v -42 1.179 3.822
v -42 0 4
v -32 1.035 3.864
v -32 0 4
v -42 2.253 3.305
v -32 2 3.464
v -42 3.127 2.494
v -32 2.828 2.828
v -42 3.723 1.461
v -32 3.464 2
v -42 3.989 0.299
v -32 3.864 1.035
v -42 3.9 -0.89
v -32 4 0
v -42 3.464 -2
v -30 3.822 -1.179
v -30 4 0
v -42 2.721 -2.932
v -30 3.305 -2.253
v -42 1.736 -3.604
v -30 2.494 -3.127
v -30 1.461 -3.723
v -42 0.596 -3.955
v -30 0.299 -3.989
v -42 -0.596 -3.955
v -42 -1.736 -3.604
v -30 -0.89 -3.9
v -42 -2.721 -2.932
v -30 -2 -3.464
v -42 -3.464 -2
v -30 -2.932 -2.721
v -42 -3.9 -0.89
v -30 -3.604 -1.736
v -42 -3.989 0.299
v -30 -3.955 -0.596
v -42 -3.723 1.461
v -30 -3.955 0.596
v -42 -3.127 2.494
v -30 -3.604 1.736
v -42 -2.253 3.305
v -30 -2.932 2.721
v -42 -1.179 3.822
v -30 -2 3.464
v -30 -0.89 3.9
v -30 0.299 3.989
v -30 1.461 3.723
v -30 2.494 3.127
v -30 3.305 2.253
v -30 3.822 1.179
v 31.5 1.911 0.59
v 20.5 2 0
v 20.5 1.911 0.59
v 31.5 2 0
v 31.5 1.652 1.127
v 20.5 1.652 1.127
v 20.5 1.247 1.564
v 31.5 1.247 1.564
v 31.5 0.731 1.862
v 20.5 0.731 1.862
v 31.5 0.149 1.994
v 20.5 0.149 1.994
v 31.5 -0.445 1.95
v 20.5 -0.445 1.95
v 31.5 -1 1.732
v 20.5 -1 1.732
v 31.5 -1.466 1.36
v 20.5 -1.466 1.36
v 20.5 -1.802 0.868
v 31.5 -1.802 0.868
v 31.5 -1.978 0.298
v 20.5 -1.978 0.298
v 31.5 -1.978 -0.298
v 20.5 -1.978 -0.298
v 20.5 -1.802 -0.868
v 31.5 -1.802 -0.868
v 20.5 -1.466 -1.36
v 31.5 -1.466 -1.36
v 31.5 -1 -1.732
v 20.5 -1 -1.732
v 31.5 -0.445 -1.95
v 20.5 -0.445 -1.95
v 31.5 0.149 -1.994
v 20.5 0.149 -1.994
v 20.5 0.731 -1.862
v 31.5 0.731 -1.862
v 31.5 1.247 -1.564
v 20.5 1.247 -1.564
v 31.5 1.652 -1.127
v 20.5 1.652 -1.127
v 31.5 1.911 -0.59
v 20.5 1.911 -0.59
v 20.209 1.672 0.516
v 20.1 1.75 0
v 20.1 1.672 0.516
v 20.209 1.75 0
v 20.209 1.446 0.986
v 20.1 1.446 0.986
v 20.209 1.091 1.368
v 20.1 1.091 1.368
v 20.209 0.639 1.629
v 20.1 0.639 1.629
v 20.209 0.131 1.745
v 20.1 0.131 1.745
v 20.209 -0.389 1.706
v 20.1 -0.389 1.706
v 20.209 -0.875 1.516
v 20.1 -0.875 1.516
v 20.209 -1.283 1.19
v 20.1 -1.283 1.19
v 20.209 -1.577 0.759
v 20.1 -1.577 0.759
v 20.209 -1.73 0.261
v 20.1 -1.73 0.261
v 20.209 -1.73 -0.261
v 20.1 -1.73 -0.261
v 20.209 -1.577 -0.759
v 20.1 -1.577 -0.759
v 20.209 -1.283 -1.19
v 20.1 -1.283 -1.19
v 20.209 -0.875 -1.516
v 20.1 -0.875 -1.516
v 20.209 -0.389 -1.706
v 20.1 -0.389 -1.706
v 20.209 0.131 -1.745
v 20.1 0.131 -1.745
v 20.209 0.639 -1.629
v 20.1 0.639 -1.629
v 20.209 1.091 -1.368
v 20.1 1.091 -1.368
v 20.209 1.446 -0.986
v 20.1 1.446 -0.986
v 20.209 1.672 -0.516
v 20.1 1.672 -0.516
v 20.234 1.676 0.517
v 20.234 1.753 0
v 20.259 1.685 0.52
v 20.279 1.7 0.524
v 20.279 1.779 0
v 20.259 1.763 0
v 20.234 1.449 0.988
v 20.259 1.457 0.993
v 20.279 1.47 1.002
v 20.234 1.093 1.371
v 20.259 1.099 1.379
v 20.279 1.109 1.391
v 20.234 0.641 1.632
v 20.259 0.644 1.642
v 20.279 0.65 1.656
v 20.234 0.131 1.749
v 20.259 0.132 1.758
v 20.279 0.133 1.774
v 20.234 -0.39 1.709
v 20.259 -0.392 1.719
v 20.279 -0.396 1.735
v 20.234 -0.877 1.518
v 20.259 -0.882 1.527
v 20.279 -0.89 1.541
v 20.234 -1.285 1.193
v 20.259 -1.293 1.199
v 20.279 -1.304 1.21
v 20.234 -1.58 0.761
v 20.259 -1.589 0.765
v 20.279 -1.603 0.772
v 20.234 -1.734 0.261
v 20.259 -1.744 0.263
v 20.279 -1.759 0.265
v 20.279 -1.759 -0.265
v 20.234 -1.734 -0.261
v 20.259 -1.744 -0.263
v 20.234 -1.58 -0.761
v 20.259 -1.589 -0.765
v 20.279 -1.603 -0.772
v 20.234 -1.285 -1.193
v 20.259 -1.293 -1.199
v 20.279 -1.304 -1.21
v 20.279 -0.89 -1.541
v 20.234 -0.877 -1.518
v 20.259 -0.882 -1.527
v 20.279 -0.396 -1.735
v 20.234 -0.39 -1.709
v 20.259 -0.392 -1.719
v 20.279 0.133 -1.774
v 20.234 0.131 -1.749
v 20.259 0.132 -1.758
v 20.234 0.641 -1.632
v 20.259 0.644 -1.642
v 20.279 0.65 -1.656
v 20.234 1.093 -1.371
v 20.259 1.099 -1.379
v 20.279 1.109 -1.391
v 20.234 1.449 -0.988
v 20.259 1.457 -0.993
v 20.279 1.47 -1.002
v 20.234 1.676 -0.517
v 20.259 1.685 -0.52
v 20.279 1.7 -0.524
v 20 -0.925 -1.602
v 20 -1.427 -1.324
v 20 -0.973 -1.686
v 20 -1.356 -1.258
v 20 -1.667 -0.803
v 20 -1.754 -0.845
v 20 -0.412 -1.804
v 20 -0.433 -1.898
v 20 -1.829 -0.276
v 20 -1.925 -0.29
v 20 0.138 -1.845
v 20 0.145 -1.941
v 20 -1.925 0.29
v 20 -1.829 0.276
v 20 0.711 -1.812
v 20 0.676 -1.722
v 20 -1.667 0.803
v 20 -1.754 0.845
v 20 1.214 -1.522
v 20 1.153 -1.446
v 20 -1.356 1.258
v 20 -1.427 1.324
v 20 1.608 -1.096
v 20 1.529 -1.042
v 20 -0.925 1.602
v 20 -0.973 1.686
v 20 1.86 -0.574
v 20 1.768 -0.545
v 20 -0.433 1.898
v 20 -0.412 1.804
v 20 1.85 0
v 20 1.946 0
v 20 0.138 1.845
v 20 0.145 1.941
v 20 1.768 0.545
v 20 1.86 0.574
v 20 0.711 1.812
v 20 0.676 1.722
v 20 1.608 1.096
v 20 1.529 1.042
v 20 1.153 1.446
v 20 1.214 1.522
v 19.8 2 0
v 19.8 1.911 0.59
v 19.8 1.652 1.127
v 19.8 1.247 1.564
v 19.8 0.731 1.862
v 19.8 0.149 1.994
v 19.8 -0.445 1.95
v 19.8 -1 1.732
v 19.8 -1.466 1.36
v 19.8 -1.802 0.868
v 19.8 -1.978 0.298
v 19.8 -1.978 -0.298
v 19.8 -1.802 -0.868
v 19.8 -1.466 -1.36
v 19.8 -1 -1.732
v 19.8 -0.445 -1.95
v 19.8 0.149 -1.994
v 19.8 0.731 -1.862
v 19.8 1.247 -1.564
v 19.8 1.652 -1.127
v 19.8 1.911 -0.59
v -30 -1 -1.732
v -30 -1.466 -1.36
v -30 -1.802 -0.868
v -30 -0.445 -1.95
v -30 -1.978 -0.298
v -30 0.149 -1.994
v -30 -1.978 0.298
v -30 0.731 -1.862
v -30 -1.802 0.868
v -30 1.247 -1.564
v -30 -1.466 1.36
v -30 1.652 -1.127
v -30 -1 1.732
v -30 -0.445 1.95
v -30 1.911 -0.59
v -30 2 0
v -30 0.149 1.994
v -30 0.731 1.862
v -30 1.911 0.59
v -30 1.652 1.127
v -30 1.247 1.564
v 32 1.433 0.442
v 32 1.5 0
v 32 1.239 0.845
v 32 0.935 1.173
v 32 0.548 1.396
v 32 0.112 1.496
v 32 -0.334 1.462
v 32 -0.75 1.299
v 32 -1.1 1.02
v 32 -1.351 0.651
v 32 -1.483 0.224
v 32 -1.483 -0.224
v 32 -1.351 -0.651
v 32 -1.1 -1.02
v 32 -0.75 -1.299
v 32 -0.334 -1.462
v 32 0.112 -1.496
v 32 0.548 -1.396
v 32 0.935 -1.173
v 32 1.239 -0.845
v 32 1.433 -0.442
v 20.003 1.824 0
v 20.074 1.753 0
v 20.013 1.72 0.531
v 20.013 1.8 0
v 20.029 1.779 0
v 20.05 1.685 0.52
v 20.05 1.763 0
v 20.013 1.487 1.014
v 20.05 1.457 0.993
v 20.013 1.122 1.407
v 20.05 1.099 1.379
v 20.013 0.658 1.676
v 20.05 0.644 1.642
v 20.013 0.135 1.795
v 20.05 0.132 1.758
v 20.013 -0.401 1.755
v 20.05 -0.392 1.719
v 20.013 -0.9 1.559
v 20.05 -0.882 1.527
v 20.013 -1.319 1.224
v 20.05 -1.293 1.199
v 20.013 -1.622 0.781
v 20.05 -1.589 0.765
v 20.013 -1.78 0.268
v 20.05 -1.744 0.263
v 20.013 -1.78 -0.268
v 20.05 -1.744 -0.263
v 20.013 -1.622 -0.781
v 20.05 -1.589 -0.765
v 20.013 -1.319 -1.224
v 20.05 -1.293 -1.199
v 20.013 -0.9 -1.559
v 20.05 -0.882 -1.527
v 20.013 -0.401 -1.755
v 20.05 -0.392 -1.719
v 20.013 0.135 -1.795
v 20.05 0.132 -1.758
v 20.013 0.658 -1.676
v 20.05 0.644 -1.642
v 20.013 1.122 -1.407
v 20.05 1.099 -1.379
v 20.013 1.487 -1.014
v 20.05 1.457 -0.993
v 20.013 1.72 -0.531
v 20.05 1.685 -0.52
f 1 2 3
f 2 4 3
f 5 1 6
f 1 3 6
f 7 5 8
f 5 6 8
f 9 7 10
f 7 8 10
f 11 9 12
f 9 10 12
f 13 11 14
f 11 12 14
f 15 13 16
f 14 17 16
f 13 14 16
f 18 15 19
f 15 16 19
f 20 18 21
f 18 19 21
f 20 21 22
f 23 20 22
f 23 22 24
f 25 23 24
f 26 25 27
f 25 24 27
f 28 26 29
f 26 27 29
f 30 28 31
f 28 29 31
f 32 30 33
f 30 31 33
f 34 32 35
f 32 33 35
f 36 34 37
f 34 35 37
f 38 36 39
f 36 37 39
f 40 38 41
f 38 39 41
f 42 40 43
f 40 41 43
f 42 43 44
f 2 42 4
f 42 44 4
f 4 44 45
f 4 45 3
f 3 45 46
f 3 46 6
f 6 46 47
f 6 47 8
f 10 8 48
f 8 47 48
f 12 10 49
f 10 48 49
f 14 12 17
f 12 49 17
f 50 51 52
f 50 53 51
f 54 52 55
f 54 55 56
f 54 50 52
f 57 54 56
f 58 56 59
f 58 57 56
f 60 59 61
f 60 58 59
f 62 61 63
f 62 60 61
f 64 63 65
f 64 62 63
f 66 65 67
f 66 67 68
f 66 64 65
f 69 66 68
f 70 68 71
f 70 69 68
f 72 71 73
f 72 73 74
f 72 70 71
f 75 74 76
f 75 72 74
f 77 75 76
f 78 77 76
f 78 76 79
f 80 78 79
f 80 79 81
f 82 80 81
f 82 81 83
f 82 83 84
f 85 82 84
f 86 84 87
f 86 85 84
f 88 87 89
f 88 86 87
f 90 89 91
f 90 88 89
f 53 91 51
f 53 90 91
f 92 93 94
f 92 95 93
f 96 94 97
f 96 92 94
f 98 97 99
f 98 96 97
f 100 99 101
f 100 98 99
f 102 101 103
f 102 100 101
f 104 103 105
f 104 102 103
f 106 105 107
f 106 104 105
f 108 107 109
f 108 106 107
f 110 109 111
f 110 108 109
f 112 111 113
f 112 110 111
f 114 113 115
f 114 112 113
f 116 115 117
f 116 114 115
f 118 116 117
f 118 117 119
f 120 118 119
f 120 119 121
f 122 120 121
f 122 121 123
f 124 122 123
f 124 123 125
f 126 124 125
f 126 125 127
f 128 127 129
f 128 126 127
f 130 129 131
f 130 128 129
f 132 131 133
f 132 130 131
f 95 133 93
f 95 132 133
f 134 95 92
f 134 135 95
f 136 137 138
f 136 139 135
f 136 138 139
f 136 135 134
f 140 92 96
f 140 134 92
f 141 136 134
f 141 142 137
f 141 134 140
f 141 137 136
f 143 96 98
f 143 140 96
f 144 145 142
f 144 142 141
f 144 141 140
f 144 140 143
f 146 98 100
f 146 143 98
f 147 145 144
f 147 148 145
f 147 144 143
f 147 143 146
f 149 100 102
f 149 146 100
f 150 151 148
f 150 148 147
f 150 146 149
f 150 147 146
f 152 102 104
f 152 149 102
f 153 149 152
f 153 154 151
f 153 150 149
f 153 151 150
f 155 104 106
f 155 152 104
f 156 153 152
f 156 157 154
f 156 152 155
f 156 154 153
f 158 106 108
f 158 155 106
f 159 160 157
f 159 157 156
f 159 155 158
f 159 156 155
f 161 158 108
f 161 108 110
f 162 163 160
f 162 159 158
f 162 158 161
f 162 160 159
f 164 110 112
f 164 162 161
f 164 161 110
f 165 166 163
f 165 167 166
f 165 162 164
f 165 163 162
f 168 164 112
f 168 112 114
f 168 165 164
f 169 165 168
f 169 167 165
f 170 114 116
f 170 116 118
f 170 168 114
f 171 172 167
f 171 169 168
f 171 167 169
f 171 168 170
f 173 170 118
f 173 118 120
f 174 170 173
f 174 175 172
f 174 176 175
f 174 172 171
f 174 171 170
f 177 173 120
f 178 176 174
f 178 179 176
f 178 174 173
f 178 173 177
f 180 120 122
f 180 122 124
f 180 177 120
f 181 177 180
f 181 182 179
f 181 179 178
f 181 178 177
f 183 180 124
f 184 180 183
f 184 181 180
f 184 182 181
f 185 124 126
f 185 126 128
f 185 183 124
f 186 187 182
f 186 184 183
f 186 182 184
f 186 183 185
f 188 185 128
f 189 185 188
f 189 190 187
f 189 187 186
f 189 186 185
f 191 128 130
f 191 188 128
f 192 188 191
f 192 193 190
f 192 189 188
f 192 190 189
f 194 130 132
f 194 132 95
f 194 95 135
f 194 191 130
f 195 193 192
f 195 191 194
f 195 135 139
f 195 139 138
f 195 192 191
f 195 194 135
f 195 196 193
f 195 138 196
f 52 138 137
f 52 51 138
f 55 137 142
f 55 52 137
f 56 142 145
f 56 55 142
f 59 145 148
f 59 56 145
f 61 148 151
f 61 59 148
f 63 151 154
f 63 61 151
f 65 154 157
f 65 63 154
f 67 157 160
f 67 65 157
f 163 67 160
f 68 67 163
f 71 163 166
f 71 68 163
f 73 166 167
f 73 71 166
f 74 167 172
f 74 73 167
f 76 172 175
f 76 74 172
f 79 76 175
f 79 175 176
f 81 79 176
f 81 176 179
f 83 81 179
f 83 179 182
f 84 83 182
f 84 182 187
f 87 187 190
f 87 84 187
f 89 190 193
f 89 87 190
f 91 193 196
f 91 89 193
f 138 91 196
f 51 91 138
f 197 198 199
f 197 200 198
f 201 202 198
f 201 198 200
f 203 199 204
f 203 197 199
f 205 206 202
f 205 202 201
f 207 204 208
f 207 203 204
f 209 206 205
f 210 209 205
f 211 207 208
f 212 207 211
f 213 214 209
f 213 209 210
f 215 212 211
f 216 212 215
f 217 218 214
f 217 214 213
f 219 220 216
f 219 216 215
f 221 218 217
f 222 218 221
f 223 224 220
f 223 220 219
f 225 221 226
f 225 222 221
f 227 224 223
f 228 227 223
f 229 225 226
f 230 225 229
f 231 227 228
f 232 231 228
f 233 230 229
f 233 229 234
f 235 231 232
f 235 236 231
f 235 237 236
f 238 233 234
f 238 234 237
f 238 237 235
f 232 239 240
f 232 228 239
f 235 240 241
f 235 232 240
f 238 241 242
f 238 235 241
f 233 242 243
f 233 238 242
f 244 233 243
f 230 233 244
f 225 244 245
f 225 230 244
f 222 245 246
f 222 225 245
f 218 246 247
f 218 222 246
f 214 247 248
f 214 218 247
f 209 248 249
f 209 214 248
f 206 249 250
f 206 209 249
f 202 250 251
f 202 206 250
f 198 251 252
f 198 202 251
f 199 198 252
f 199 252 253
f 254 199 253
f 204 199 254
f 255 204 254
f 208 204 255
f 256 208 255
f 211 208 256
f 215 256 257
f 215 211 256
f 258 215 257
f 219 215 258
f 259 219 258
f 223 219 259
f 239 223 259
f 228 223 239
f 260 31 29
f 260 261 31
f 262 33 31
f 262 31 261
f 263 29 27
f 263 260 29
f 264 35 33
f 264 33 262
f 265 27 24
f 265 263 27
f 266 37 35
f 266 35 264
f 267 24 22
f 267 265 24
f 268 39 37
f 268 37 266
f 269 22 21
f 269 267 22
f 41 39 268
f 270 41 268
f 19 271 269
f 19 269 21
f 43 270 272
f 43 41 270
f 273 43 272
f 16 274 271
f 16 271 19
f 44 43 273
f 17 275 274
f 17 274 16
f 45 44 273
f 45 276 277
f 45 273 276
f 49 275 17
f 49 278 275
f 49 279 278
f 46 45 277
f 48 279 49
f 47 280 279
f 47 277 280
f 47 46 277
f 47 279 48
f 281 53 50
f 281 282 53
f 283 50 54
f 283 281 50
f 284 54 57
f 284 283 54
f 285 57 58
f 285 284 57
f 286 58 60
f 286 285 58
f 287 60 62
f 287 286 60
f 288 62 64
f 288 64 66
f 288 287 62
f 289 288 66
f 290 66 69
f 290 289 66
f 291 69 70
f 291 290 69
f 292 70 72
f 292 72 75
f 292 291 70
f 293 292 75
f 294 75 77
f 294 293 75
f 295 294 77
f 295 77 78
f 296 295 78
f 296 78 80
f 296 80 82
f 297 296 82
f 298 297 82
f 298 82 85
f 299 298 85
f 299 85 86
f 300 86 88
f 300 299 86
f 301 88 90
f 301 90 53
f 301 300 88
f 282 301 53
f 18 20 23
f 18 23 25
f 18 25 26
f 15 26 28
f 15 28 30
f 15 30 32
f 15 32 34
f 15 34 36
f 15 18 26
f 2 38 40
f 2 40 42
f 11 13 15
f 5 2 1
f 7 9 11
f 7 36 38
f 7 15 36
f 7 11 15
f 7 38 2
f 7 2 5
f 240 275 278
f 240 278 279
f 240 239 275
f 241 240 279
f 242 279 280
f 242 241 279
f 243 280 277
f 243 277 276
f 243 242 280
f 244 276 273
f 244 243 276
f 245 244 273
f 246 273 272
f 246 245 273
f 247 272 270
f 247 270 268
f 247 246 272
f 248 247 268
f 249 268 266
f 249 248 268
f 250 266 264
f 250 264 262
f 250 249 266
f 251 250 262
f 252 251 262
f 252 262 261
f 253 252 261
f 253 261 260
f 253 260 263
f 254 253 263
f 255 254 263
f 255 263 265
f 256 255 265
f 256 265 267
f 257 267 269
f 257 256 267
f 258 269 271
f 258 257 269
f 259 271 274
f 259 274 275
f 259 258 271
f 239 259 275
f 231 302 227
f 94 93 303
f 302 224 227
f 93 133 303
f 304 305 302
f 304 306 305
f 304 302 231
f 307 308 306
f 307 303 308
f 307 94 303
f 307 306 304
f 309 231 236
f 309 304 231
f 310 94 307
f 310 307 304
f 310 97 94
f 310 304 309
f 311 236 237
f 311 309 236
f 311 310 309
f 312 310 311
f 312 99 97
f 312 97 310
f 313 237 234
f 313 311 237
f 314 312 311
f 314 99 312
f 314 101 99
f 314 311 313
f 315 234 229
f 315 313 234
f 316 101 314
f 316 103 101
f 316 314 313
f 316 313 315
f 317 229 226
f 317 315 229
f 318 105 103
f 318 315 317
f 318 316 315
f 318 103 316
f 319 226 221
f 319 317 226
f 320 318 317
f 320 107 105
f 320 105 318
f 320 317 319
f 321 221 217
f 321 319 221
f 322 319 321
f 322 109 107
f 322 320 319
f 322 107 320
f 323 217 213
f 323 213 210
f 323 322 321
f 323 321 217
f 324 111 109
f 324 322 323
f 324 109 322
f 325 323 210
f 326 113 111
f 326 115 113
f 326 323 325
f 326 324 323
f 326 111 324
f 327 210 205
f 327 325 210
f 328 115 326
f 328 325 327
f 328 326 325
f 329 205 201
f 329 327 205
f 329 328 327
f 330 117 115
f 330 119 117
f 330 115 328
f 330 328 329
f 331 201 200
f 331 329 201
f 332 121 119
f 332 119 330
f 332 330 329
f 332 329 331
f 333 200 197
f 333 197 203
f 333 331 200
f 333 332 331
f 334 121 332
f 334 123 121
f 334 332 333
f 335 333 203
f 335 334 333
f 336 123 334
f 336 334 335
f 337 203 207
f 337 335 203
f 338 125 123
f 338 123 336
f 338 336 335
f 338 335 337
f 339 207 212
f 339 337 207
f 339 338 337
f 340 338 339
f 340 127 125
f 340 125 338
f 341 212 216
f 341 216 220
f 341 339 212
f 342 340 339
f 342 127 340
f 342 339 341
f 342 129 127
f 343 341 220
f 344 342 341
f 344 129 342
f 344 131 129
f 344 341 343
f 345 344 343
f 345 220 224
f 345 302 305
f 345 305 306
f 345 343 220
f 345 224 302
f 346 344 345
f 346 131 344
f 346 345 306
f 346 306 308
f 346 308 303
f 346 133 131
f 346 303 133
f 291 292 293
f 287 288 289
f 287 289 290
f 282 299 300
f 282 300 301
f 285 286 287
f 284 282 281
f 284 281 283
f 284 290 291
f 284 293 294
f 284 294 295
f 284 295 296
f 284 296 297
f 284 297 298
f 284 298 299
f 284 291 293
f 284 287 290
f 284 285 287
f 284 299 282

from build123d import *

# Parameters (mm, degrees)
SKETCH3_R = 4
P_L_DEPTH = 10


with BuildPart() as part:
    # Sketch1 → Revolve1 (revolve)
    with BuildSketch(Plane.XY):
        with BuildLine():
            Line((-30, 2), (19.8, 2))
            Line((19.8, 2), (20, 1.946410162))
            Line((20, 1.946410162), (20, 1.85))
            ThreePointArc((20, 1.85), (20.029289322, 1.779289322), (20.1, 1.75))
            Line((20.1, 1.75), (20.208578644, 1.75))
            ThreePointArc((20.208578644, 1.75), (20.246846987, 1.757612047), (20.279289322, 1.779289322))
            Line((20.279289322, 1.779289322), (20.5, 2))
            Line((20.5, 2), (31.5, 2))
            Line((31.5, 2), (32, 1.5))
            Line((32, 1.5), (32, 0))
            Line((32, 0), (-32, 0))
            Line((-32, 0), (-32, 4))
            Line((-32, 4), (-30, 4))
            Line((-30, 4), (-30, 2))
        make_face()
    revolve(axis=Axis((0, 0, 0), (1, 0, 0)))

    # Sketch3 → P-L (add)
    with BuildSketch(Plane.ZY.offset(32)):
        Circle(SKETCH3_R)
    extrude(amount=P_L_DEPTH)


solid = part.part
